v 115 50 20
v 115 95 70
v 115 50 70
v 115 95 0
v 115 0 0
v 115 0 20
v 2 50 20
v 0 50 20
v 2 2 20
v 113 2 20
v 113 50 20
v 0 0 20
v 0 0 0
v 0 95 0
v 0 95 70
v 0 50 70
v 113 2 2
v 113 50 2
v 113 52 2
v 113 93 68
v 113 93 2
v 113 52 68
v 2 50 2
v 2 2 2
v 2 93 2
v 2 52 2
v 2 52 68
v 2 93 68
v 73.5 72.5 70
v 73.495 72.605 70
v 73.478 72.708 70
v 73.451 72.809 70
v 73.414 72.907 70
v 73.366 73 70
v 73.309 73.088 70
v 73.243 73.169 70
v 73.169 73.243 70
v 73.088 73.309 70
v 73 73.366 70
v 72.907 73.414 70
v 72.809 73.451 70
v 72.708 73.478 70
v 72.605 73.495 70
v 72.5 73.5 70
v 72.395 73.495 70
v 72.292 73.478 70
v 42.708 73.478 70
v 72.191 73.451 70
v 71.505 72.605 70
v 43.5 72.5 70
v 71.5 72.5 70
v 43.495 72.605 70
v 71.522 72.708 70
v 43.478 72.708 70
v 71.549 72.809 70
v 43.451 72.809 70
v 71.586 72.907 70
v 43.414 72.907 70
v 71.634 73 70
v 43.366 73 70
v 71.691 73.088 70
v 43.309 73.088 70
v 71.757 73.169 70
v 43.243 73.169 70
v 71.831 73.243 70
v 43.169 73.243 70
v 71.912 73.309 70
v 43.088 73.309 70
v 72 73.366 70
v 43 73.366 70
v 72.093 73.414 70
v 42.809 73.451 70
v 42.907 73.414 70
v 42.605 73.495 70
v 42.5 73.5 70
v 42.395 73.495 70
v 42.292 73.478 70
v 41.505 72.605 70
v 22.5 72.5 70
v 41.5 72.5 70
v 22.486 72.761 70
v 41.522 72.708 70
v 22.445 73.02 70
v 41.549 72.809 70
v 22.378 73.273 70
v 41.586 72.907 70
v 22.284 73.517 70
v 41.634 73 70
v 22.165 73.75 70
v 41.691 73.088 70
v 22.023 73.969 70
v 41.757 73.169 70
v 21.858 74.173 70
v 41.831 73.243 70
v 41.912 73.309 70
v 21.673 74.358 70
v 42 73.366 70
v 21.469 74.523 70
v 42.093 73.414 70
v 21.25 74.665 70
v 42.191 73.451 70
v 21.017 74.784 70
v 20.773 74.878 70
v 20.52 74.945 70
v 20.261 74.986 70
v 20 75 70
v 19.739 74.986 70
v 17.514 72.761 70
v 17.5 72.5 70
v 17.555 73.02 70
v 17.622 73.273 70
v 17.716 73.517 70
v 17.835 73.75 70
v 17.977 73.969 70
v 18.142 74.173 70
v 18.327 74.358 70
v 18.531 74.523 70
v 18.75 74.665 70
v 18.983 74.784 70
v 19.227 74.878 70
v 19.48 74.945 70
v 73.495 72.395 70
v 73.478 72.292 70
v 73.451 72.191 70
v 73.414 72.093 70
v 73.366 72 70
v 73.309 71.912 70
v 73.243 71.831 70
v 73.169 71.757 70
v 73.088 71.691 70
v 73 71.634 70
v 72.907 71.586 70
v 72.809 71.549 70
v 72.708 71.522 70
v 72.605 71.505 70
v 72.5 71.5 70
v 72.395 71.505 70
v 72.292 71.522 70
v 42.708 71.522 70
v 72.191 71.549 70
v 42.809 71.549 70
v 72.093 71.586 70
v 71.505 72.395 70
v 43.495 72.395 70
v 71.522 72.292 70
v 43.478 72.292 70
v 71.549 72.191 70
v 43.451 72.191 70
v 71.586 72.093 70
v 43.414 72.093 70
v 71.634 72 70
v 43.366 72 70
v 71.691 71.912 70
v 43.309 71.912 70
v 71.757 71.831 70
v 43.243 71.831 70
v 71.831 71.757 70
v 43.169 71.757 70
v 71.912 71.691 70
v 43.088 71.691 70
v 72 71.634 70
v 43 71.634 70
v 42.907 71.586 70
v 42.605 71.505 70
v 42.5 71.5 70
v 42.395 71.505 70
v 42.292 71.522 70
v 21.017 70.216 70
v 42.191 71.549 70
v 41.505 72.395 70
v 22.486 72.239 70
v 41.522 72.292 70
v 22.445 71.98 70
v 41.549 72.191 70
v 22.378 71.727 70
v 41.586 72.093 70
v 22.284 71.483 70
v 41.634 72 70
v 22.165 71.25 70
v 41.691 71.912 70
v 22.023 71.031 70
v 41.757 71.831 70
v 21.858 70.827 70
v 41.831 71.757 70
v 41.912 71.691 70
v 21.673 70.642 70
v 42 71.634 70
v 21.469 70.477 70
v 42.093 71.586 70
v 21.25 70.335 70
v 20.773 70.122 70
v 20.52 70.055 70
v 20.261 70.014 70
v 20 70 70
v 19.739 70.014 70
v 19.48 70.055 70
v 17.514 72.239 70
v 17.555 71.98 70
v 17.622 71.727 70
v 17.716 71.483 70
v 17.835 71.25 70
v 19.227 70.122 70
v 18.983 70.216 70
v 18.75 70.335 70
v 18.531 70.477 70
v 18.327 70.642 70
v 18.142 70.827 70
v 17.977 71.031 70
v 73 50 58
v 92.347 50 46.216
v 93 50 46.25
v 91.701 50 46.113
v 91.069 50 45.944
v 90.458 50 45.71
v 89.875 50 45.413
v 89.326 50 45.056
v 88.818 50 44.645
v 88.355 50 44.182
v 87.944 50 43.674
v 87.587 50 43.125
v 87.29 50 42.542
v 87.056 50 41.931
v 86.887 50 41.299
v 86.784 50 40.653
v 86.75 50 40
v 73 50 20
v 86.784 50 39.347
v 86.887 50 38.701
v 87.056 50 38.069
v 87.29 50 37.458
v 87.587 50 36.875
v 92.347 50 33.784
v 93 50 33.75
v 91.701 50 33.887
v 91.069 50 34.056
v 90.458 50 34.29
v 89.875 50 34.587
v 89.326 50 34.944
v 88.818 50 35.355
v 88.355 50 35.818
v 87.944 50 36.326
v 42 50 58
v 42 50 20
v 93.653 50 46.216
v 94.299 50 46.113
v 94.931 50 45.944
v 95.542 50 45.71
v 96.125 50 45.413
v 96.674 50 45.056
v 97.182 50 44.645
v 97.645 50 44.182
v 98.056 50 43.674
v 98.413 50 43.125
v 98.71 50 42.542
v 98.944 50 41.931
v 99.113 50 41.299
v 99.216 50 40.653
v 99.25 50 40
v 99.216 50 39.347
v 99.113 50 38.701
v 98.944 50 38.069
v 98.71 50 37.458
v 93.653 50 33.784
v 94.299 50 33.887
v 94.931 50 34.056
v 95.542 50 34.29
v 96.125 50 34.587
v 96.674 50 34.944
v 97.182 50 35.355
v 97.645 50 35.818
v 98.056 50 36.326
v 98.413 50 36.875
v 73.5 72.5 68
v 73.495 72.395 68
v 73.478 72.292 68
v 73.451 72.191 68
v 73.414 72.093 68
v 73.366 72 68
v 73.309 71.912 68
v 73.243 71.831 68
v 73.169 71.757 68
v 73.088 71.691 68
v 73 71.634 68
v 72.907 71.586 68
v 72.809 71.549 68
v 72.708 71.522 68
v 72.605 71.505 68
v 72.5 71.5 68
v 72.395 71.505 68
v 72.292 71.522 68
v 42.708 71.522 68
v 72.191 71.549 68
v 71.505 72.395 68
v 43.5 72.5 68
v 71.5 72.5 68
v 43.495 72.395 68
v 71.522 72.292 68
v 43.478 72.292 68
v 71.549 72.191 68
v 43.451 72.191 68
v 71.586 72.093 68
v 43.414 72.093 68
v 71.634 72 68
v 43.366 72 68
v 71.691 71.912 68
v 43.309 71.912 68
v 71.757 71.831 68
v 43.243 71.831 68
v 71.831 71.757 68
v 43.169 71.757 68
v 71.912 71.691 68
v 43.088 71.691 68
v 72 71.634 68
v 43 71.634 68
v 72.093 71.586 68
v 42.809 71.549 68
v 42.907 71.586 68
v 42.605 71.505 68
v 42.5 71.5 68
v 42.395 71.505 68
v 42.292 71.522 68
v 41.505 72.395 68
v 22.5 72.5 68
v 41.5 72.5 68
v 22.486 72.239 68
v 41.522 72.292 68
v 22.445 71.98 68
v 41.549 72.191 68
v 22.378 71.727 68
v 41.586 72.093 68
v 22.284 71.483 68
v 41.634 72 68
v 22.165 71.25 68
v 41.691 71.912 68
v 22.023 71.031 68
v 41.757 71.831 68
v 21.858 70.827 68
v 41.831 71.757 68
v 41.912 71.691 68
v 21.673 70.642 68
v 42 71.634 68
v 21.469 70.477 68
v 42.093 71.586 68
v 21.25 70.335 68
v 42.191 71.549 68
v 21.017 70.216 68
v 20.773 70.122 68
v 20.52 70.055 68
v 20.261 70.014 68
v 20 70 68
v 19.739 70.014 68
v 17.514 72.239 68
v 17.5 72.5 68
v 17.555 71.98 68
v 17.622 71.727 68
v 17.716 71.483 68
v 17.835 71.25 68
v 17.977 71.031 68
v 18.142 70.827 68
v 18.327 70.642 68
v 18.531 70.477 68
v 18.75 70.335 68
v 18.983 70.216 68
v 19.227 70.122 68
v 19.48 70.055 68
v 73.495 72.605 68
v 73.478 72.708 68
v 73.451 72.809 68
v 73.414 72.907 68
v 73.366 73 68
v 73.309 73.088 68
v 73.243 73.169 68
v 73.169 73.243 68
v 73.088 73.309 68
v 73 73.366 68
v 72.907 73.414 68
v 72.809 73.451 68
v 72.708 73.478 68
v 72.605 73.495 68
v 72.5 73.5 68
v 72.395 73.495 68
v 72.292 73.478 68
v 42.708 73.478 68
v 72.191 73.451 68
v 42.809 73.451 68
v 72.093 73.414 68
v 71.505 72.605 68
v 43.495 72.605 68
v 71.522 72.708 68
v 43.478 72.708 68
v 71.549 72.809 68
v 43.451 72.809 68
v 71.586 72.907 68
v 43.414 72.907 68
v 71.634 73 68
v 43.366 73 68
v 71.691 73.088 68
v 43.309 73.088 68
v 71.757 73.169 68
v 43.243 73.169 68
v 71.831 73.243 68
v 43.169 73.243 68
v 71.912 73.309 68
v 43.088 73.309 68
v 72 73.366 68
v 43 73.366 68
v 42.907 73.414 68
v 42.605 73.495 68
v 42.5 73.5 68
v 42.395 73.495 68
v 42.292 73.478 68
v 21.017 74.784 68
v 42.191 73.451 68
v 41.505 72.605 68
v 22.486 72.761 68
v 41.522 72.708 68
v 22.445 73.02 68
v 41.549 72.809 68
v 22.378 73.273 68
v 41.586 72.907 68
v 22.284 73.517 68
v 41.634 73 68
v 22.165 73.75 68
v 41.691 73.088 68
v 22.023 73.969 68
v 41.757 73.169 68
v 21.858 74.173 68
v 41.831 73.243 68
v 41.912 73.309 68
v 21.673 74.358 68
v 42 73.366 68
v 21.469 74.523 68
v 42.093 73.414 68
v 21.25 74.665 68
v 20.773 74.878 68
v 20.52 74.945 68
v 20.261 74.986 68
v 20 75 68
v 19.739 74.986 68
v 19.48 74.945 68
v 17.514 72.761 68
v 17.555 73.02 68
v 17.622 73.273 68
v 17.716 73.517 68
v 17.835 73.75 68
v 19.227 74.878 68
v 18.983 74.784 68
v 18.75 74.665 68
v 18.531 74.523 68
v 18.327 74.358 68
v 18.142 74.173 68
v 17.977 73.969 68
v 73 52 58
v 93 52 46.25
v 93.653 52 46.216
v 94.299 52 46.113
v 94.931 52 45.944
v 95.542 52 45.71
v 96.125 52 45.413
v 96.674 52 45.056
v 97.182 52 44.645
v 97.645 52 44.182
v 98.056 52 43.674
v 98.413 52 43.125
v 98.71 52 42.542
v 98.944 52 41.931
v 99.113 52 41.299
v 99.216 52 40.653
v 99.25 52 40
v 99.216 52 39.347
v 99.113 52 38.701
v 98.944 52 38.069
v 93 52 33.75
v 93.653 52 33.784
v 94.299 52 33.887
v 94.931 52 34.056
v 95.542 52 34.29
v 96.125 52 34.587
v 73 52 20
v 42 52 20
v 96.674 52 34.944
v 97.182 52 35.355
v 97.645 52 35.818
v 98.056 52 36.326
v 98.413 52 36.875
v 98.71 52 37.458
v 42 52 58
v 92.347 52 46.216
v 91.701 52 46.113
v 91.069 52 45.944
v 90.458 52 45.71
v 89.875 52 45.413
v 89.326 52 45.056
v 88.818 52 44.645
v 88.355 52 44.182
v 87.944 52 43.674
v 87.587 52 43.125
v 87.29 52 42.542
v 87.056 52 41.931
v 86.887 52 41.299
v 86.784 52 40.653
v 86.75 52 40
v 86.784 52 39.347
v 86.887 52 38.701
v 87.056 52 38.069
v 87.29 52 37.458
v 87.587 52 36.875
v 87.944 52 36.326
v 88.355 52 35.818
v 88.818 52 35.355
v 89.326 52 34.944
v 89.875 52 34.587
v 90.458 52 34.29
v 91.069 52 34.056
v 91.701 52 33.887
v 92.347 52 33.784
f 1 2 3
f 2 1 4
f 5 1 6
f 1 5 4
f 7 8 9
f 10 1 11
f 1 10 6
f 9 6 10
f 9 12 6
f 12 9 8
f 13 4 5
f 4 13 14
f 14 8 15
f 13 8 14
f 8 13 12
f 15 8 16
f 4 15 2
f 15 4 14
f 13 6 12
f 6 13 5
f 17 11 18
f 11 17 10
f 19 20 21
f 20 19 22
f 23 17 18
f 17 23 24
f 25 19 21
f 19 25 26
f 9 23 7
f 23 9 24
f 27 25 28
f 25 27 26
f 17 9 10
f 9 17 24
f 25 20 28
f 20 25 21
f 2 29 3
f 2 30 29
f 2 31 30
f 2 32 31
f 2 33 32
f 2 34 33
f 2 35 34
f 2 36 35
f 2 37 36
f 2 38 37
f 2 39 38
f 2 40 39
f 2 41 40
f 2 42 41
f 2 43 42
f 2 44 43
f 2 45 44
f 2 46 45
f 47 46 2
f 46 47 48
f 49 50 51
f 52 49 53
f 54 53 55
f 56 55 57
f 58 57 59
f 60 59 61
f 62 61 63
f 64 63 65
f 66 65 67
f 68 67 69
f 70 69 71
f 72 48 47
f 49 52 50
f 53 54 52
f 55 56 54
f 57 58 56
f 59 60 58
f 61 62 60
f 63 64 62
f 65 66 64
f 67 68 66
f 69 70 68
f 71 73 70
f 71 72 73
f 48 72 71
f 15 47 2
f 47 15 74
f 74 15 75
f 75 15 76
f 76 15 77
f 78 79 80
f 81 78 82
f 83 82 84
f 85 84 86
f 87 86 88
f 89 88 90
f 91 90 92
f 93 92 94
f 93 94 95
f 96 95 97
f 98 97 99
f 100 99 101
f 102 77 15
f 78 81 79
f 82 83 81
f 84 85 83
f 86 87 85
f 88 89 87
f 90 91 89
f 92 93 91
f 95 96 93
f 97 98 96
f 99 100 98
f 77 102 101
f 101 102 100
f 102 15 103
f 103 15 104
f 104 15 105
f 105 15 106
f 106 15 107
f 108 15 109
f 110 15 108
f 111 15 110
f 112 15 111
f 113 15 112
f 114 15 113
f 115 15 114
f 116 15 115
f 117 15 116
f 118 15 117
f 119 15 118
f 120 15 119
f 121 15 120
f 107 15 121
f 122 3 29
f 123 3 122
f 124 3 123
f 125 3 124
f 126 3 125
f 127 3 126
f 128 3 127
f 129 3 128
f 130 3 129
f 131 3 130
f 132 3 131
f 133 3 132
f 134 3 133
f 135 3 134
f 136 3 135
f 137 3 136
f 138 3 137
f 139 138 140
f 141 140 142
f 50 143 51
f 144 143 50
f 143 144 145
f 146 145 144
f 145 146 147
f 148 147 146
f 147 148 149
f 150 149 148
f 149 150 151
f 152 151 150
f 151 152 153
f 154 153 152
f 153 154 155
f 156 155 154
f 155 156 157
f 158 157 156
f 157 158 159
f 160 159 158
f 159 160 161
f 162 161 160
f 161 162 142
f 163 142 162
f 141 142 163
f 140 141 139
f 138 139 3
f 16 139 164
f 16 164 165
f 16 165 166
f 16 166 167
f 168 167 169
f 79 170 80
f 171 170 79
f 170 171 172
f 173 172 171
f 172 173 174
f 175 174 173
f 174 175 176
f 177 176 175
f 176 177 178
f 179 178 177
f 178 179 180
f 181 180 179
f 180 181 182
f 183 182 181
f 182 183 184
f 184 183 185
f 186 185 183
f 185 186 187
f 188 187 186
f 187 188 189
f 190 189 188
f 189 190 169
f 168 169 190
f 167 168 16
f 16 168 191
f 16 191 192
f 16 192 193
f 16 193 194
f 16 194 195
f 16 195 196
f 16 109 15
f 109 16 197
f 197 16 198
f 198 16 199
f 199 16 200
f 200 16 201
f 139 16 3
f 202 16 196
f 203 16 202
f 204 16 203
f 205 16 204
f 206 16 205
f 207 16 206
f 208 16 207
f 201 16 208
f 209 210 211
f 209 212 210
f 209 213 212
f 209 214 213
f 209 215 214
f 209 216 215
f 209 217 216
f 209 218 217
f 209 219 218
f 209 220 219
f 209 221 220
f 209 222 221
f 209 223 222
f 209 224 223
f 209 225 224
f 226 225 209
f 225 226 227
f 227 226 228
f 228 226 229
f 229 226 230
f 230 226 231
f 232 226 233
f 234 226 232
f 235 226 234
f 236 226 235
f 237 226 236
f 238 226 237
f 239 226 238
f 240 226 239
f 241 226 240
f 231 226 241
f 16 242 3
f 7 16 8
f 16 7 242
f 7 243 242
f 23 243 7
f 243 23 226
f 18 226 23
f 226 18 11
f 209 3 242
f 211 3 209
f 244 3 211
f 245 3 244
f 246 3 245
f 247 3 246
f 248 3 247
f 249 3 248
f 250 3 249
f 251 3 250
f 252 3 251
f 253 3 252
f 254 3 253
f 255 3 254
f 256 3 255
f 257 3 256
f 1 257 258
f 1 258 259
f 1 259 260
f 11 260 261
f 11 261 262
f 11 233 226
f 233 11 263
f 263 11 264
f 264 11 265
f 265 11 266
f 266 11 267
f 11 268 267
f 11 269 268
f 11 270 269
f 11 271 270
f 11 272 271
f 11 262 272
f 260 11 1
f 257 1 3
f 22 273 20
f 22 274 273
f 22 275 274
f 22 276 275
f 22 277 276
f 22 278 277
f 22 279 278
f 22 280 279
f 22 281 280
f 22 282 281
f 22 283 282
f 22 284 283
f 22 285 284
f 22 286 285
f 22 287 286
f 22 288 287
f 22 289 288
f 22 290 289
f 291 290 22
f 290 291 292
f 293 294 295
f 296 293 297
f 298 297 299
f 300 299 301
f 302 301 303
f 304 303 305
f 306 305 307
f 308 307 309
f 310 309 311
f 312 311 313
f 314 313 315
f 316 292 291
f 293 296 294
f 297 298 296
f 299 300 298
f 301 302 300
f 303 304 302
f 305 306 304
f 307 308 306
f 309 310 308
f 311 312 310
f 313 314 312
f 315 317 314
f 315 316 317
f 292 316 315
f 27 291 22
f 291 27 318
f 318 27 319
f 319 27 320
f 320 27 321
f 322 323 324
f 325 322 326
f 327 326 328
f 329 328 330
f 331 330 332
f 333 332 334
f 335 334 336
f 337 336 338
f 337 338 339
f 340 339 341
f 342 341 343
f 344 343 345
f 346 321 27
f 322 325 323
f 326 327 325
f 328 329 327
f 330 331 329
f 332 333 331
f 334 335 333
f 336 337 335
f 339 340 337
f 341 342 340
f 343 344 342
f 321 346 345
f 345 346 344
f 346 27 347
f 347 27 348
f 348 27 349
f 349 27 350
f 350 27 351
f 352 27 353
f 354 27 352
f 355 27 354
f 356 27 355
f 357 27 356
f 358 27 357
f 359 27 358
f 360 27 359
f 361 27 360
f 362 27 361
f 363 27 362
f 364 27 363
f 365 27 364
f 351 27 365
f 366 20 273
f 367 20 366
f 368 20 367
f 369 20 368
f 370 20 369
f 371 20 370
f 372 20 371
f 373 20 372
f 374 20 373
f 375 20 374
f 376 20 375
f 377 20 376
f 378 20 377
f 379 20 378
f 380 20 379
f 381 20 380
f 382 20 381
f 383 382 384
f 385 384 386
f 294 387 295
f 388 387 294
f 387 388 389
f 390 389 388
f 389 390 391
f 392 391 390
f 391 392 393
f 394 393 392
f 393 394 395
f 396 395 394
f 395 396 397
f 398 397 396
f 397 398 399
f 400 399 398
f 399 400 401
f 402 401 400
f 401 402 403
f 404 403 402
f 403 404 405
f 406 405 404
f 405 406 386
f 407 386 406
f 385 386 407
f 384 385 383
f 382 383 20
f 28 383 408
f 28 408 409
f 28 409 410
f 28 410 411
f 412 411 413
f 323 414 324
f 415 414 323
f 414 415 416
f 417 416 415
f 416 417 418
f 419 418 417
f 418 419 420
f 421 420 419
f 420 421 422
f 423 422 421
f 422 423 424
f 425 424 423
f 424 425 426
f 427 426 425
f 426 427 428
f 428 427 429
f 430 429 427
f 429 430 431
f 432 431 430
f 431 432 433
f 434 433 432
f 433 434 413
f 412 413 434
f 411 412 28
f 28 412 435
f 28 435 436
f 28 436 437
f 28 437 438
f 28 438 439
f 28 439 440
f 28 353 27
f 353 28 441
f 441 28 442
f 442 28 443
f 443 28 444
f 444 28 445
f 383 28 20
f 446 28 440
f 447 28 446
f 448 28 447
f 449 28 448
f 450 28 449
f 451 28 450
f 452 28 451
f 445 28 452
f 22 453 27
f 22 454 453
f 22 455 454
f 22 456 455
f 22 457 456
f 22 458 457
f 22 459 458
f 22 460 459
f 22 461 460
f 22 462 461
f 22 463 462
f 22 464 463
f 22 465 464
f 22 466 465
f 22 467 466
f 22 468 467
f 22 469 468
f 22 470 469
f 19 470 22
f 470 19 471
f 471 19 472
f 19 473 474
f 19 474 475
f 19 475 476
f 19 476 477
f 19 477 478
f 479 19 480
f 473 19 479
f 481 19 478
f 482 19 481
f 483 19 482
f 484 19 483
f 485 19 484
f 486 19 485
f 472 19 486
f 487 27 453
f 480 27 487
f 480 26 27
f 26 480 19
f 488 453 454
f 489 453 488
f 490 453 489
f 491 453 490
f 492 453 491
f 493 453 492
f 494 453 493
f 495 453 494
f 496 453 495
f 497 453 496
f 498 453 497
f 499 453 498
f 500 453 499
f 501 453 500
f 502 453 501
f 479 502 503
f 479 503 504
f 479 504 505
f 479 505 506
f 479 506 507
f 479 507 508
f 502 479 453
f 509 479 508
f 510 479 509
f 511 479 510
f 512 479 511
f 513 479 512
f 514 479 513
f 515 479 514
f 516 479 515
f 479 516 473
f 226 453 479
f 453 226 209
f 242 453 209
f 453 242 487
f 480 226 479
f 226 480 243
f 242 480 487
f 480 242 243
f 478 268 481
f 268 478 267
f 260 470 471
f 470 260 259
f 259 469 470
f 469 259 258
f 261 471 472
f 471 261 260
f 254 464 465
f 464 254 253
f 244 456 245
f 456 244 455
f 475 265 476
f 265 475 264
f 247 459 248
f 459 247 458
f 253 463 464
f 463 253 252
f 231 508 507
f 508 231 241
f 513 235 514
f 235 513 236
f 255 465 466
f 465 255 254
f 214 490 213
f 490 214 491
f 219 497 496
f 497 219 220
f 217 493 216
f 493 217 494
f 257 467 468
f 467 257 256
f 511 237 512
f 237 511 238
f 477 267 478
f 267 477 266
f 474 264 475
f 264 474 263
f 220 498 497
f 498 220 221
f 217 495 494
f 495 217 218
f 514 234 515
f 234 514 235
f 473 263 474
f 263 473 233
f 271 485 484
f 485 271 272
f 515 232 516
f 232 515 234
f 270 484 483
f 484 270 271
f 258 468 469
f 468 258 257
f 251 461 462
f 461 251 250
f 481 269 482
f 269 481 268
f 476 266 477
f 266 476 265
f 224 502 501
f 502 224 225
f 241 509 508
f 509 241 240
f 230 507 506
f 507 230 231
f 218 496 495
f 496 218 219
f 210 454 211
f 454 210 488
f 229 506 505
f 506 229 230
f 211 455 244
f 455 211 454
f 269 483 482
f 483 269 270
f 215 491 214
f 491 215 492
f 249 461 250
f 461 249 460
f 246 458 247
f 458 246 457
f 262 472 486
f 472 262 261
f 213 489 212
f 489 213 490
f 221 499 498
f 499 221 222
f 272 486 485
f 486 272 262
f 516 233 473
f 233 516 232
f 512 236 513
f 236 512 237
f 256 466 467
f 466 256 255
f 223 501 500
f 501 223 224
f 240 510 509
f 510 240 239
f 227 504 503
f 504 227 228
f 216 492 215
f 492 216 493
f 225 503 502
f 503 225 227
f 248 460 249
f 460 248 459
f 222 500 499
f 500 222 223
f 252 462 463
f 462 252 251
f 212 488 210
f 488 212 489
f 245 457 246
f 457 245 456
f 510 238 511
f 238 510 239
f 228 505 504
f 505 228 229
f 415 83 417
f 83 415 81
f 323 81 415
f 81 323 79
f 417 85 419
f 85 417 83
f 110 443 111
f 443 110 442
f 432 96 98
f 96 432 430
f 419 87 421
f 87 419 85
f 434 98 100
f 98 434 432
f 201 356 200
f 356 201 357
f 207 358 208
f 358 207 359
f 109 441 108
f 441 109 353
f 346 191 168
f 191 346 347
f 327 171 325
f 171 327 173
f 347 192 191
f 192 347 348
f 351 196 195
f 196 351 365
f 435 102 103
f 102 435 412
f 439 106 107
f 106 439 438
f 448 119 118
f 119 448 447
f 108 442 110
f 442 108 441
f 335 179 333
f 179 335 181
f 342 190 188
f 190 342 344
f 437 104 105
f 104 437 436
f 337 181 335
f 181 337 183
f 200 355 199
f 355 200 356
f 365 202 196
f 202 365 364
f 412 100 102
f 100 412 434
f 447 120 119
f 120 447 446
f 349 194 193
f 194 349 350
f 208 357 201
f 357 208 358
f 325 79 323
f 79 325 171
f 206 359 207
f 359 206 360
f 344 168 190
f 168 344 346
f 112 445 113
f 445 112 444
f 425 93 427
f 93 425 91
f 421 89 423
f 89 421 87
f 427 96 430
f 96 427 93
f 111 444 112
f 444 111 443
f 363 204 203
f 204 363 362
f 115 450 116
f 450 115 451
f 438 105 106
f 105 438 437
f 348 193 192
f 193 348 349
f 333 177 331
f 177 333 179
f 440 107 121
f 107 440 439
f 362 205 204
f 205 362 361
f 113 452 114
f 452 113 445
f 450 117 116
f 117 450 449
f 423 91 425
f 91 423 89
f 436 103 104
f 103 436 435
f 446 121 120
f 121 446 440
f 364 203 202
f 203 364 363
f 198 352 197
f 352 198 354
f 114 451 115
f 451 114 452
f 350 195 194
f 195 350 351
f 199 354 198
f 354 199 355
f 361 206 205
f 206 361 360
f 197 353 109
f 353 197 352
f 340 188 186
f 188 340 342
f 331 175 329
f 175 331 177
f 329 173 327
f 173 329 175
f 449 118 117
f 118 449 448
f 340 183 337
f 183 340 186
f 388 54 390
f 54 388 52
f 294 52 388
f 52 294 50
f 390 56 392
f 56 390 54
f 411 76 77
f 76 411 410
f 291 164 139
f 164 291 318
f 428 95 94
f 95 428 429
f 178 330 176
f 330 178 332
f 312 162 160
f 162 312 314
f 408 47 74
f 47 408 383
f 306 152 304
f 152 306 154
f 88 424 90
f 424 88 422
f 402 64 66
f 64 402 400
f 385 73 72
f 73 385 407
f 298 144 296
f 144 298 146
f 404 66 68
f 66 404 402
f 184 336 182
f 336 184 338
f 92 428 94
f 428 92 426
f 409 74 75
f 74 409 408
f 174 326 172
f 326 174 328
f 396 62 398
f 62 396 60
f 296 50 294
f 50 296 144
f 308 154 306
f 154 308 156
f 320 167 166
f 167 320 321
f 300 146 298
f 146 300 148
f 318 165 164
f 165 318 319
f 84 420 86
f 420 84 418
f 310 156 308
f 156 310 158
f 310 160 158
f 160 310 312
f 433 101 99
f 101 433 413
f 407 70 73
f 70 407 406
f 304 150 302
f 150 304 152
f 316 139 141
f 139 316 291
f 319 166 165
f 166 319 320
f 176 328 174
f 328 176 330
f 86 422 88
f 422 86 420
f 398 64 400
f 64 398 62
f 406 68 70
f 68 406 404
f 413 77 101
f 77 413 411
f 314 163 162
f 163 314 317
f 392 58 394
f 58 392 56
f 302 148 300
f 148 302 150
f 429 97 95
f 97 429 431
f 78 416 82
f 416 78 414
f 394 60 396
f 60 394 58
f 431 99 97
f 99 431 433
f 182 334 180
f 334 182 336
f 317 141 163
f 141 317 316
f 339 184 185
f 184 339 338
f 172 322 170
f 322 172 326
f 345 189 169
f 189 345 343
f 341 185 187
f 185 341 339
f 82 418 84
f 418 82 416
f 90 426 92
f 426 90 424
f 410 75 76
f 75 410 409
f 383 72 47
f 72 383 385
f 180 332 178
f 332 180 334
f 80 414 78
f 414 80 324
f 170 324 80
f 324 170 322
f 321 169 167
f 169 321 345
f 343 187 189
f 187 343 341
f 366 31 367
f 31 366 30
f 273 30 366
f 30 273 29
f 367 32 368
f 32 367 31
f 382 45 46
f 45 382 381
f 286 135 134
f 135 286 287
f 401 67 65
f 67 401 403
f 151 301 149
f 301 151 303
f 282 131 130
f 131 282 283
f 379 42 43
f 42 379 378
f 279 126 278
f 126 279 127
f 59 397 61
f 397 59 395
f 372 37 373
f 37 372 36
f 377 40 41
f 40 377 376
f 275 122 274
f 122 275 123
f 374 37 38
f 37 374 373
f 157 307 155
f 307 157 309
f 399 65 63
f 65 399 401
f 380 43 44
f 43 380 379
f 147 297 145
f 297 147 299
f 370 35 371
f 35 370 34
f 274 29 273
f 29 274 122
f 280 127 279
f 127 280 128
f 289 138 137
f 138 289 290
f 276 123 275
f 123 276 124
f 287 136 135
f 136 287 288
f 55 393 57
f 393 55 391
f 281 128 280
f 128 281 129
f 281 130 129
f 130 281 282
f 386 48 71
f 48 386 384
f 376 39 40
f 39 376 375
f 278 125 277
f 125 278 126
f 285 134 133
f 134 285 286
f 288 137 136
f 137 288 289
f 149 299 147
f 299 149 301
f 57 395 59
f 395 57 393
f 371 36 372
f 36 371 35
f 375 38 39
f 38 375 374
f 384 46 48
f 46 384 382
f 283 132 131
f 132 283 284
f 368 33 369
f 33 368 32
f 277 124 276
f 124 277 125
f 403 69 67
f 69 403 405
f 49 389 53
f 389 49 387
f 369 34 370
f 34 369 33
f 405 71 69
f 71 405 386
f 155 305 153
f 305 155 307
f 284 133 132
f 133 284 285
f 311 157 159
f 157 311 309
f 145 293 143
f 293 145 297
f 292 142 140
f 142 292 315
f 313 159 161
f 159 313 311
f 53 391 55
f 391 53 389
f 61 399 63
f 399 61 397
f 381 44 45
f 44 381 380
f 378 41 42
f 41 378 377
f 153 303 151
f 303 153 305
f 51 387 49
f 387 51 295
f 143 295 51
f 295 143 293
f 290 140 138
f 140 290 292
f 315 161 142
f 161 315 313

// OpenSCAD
// =============================================================================
// Wake 睡眠环境守夜盒 · 方案二: 积木阶梯双层快拆盒 (Modular Cyber Tray)
// 设计者: 刘航成 & 夏工 & Antigravity
// 适用机型: 拓竹 Bambu Lab P1S / A1 / X1C
// 特点: 前低后高阶梯结构，极速排障，免拆螺丝，Bambu 50分钟极速打印
// =============================================================================

$fn = 60;

// 主尺寸
box_w = 115;
tray_d = 50;      // 前部面包板托盘深度
tower_d = 45;     // 后部主板塔楼深度
total_d = tray_d + tower_d; // 95mm
h_tray = 20;      // 前托盘高度
h_tower = 70;     // 后塔楼高度
wall = 2.0;

// 1. 打印视图: 0=完整装配, 1=底座托盘, 2=主控塔楼盖
part = 0;

if (part == 0) {
    color("DimGray") bottom_tray();
    translate([0, tray_d, 0]) color("DeepSkyBlue", 0.9) top_tower();
} else if (part == 1) {
    bottom_tray();
} else if (part == 2) {
    top_tower();
}

module bottom_tray() {
    difference() {
        cube([box_w, total_d, h_tray]);
        // 掏空前舱: 容纳面包板
        translate([wall, wall, wall])
            cube([box_w - 2*wall, tray_d - wall, h_tray]);
        // 掏空后舱: 走线穿线过孔
        translate([wall, tray_d, wall])
            cube([box_w - 2*wall, tower_d - wall, h_tray]);
        // 侧面 Type-C 接口槽
        translate([-0.1, tray_d + 15, wall + 2])
            cube([wall + 0.2, 14, 8]);
    }
}

module top_tower() {
    difference() {
        cube([box_w, tower_d, h_tower]);
        // 掏空内部放 ESP32-S3 Korvo 2 V3
        translate([wall, wall, 0])
            cube([box_w - 2*wall, tower_d - 2*wall, h_tower - wall]);
            
        // 屏幕开孔 (垂直嵌于塔楼前面板)
        translate([(box_w - 31)/2, -0.1, 20])
            cube([31, wall + 0.2, 38]);
            
        // PIR 开孔
        translate([box_w - 22, -0.1, 40])
            rotate([-90, 0, 0])
                cylinder(d = 12.5, h = wall + 0.2);
                
        // 顶部光敏孔
        translate([20, tower_d/2, h_tower - wall - 0.1])
            cylinder(d = 5.0, h = wall + 0.2);
            
        // 顶部麦克风拾音孔
        translate([box_w/2 - 15, tower_d/2, h_tower - wall - 0.1])
            cylinder(d = 2.0, h = wall + 0.2);
        translate([box_w/2 + 15, tower_d/2, h_tower - wall - 0.1])
            cylinder(d = 2.0, h = wall + 0.2);
    }
}
